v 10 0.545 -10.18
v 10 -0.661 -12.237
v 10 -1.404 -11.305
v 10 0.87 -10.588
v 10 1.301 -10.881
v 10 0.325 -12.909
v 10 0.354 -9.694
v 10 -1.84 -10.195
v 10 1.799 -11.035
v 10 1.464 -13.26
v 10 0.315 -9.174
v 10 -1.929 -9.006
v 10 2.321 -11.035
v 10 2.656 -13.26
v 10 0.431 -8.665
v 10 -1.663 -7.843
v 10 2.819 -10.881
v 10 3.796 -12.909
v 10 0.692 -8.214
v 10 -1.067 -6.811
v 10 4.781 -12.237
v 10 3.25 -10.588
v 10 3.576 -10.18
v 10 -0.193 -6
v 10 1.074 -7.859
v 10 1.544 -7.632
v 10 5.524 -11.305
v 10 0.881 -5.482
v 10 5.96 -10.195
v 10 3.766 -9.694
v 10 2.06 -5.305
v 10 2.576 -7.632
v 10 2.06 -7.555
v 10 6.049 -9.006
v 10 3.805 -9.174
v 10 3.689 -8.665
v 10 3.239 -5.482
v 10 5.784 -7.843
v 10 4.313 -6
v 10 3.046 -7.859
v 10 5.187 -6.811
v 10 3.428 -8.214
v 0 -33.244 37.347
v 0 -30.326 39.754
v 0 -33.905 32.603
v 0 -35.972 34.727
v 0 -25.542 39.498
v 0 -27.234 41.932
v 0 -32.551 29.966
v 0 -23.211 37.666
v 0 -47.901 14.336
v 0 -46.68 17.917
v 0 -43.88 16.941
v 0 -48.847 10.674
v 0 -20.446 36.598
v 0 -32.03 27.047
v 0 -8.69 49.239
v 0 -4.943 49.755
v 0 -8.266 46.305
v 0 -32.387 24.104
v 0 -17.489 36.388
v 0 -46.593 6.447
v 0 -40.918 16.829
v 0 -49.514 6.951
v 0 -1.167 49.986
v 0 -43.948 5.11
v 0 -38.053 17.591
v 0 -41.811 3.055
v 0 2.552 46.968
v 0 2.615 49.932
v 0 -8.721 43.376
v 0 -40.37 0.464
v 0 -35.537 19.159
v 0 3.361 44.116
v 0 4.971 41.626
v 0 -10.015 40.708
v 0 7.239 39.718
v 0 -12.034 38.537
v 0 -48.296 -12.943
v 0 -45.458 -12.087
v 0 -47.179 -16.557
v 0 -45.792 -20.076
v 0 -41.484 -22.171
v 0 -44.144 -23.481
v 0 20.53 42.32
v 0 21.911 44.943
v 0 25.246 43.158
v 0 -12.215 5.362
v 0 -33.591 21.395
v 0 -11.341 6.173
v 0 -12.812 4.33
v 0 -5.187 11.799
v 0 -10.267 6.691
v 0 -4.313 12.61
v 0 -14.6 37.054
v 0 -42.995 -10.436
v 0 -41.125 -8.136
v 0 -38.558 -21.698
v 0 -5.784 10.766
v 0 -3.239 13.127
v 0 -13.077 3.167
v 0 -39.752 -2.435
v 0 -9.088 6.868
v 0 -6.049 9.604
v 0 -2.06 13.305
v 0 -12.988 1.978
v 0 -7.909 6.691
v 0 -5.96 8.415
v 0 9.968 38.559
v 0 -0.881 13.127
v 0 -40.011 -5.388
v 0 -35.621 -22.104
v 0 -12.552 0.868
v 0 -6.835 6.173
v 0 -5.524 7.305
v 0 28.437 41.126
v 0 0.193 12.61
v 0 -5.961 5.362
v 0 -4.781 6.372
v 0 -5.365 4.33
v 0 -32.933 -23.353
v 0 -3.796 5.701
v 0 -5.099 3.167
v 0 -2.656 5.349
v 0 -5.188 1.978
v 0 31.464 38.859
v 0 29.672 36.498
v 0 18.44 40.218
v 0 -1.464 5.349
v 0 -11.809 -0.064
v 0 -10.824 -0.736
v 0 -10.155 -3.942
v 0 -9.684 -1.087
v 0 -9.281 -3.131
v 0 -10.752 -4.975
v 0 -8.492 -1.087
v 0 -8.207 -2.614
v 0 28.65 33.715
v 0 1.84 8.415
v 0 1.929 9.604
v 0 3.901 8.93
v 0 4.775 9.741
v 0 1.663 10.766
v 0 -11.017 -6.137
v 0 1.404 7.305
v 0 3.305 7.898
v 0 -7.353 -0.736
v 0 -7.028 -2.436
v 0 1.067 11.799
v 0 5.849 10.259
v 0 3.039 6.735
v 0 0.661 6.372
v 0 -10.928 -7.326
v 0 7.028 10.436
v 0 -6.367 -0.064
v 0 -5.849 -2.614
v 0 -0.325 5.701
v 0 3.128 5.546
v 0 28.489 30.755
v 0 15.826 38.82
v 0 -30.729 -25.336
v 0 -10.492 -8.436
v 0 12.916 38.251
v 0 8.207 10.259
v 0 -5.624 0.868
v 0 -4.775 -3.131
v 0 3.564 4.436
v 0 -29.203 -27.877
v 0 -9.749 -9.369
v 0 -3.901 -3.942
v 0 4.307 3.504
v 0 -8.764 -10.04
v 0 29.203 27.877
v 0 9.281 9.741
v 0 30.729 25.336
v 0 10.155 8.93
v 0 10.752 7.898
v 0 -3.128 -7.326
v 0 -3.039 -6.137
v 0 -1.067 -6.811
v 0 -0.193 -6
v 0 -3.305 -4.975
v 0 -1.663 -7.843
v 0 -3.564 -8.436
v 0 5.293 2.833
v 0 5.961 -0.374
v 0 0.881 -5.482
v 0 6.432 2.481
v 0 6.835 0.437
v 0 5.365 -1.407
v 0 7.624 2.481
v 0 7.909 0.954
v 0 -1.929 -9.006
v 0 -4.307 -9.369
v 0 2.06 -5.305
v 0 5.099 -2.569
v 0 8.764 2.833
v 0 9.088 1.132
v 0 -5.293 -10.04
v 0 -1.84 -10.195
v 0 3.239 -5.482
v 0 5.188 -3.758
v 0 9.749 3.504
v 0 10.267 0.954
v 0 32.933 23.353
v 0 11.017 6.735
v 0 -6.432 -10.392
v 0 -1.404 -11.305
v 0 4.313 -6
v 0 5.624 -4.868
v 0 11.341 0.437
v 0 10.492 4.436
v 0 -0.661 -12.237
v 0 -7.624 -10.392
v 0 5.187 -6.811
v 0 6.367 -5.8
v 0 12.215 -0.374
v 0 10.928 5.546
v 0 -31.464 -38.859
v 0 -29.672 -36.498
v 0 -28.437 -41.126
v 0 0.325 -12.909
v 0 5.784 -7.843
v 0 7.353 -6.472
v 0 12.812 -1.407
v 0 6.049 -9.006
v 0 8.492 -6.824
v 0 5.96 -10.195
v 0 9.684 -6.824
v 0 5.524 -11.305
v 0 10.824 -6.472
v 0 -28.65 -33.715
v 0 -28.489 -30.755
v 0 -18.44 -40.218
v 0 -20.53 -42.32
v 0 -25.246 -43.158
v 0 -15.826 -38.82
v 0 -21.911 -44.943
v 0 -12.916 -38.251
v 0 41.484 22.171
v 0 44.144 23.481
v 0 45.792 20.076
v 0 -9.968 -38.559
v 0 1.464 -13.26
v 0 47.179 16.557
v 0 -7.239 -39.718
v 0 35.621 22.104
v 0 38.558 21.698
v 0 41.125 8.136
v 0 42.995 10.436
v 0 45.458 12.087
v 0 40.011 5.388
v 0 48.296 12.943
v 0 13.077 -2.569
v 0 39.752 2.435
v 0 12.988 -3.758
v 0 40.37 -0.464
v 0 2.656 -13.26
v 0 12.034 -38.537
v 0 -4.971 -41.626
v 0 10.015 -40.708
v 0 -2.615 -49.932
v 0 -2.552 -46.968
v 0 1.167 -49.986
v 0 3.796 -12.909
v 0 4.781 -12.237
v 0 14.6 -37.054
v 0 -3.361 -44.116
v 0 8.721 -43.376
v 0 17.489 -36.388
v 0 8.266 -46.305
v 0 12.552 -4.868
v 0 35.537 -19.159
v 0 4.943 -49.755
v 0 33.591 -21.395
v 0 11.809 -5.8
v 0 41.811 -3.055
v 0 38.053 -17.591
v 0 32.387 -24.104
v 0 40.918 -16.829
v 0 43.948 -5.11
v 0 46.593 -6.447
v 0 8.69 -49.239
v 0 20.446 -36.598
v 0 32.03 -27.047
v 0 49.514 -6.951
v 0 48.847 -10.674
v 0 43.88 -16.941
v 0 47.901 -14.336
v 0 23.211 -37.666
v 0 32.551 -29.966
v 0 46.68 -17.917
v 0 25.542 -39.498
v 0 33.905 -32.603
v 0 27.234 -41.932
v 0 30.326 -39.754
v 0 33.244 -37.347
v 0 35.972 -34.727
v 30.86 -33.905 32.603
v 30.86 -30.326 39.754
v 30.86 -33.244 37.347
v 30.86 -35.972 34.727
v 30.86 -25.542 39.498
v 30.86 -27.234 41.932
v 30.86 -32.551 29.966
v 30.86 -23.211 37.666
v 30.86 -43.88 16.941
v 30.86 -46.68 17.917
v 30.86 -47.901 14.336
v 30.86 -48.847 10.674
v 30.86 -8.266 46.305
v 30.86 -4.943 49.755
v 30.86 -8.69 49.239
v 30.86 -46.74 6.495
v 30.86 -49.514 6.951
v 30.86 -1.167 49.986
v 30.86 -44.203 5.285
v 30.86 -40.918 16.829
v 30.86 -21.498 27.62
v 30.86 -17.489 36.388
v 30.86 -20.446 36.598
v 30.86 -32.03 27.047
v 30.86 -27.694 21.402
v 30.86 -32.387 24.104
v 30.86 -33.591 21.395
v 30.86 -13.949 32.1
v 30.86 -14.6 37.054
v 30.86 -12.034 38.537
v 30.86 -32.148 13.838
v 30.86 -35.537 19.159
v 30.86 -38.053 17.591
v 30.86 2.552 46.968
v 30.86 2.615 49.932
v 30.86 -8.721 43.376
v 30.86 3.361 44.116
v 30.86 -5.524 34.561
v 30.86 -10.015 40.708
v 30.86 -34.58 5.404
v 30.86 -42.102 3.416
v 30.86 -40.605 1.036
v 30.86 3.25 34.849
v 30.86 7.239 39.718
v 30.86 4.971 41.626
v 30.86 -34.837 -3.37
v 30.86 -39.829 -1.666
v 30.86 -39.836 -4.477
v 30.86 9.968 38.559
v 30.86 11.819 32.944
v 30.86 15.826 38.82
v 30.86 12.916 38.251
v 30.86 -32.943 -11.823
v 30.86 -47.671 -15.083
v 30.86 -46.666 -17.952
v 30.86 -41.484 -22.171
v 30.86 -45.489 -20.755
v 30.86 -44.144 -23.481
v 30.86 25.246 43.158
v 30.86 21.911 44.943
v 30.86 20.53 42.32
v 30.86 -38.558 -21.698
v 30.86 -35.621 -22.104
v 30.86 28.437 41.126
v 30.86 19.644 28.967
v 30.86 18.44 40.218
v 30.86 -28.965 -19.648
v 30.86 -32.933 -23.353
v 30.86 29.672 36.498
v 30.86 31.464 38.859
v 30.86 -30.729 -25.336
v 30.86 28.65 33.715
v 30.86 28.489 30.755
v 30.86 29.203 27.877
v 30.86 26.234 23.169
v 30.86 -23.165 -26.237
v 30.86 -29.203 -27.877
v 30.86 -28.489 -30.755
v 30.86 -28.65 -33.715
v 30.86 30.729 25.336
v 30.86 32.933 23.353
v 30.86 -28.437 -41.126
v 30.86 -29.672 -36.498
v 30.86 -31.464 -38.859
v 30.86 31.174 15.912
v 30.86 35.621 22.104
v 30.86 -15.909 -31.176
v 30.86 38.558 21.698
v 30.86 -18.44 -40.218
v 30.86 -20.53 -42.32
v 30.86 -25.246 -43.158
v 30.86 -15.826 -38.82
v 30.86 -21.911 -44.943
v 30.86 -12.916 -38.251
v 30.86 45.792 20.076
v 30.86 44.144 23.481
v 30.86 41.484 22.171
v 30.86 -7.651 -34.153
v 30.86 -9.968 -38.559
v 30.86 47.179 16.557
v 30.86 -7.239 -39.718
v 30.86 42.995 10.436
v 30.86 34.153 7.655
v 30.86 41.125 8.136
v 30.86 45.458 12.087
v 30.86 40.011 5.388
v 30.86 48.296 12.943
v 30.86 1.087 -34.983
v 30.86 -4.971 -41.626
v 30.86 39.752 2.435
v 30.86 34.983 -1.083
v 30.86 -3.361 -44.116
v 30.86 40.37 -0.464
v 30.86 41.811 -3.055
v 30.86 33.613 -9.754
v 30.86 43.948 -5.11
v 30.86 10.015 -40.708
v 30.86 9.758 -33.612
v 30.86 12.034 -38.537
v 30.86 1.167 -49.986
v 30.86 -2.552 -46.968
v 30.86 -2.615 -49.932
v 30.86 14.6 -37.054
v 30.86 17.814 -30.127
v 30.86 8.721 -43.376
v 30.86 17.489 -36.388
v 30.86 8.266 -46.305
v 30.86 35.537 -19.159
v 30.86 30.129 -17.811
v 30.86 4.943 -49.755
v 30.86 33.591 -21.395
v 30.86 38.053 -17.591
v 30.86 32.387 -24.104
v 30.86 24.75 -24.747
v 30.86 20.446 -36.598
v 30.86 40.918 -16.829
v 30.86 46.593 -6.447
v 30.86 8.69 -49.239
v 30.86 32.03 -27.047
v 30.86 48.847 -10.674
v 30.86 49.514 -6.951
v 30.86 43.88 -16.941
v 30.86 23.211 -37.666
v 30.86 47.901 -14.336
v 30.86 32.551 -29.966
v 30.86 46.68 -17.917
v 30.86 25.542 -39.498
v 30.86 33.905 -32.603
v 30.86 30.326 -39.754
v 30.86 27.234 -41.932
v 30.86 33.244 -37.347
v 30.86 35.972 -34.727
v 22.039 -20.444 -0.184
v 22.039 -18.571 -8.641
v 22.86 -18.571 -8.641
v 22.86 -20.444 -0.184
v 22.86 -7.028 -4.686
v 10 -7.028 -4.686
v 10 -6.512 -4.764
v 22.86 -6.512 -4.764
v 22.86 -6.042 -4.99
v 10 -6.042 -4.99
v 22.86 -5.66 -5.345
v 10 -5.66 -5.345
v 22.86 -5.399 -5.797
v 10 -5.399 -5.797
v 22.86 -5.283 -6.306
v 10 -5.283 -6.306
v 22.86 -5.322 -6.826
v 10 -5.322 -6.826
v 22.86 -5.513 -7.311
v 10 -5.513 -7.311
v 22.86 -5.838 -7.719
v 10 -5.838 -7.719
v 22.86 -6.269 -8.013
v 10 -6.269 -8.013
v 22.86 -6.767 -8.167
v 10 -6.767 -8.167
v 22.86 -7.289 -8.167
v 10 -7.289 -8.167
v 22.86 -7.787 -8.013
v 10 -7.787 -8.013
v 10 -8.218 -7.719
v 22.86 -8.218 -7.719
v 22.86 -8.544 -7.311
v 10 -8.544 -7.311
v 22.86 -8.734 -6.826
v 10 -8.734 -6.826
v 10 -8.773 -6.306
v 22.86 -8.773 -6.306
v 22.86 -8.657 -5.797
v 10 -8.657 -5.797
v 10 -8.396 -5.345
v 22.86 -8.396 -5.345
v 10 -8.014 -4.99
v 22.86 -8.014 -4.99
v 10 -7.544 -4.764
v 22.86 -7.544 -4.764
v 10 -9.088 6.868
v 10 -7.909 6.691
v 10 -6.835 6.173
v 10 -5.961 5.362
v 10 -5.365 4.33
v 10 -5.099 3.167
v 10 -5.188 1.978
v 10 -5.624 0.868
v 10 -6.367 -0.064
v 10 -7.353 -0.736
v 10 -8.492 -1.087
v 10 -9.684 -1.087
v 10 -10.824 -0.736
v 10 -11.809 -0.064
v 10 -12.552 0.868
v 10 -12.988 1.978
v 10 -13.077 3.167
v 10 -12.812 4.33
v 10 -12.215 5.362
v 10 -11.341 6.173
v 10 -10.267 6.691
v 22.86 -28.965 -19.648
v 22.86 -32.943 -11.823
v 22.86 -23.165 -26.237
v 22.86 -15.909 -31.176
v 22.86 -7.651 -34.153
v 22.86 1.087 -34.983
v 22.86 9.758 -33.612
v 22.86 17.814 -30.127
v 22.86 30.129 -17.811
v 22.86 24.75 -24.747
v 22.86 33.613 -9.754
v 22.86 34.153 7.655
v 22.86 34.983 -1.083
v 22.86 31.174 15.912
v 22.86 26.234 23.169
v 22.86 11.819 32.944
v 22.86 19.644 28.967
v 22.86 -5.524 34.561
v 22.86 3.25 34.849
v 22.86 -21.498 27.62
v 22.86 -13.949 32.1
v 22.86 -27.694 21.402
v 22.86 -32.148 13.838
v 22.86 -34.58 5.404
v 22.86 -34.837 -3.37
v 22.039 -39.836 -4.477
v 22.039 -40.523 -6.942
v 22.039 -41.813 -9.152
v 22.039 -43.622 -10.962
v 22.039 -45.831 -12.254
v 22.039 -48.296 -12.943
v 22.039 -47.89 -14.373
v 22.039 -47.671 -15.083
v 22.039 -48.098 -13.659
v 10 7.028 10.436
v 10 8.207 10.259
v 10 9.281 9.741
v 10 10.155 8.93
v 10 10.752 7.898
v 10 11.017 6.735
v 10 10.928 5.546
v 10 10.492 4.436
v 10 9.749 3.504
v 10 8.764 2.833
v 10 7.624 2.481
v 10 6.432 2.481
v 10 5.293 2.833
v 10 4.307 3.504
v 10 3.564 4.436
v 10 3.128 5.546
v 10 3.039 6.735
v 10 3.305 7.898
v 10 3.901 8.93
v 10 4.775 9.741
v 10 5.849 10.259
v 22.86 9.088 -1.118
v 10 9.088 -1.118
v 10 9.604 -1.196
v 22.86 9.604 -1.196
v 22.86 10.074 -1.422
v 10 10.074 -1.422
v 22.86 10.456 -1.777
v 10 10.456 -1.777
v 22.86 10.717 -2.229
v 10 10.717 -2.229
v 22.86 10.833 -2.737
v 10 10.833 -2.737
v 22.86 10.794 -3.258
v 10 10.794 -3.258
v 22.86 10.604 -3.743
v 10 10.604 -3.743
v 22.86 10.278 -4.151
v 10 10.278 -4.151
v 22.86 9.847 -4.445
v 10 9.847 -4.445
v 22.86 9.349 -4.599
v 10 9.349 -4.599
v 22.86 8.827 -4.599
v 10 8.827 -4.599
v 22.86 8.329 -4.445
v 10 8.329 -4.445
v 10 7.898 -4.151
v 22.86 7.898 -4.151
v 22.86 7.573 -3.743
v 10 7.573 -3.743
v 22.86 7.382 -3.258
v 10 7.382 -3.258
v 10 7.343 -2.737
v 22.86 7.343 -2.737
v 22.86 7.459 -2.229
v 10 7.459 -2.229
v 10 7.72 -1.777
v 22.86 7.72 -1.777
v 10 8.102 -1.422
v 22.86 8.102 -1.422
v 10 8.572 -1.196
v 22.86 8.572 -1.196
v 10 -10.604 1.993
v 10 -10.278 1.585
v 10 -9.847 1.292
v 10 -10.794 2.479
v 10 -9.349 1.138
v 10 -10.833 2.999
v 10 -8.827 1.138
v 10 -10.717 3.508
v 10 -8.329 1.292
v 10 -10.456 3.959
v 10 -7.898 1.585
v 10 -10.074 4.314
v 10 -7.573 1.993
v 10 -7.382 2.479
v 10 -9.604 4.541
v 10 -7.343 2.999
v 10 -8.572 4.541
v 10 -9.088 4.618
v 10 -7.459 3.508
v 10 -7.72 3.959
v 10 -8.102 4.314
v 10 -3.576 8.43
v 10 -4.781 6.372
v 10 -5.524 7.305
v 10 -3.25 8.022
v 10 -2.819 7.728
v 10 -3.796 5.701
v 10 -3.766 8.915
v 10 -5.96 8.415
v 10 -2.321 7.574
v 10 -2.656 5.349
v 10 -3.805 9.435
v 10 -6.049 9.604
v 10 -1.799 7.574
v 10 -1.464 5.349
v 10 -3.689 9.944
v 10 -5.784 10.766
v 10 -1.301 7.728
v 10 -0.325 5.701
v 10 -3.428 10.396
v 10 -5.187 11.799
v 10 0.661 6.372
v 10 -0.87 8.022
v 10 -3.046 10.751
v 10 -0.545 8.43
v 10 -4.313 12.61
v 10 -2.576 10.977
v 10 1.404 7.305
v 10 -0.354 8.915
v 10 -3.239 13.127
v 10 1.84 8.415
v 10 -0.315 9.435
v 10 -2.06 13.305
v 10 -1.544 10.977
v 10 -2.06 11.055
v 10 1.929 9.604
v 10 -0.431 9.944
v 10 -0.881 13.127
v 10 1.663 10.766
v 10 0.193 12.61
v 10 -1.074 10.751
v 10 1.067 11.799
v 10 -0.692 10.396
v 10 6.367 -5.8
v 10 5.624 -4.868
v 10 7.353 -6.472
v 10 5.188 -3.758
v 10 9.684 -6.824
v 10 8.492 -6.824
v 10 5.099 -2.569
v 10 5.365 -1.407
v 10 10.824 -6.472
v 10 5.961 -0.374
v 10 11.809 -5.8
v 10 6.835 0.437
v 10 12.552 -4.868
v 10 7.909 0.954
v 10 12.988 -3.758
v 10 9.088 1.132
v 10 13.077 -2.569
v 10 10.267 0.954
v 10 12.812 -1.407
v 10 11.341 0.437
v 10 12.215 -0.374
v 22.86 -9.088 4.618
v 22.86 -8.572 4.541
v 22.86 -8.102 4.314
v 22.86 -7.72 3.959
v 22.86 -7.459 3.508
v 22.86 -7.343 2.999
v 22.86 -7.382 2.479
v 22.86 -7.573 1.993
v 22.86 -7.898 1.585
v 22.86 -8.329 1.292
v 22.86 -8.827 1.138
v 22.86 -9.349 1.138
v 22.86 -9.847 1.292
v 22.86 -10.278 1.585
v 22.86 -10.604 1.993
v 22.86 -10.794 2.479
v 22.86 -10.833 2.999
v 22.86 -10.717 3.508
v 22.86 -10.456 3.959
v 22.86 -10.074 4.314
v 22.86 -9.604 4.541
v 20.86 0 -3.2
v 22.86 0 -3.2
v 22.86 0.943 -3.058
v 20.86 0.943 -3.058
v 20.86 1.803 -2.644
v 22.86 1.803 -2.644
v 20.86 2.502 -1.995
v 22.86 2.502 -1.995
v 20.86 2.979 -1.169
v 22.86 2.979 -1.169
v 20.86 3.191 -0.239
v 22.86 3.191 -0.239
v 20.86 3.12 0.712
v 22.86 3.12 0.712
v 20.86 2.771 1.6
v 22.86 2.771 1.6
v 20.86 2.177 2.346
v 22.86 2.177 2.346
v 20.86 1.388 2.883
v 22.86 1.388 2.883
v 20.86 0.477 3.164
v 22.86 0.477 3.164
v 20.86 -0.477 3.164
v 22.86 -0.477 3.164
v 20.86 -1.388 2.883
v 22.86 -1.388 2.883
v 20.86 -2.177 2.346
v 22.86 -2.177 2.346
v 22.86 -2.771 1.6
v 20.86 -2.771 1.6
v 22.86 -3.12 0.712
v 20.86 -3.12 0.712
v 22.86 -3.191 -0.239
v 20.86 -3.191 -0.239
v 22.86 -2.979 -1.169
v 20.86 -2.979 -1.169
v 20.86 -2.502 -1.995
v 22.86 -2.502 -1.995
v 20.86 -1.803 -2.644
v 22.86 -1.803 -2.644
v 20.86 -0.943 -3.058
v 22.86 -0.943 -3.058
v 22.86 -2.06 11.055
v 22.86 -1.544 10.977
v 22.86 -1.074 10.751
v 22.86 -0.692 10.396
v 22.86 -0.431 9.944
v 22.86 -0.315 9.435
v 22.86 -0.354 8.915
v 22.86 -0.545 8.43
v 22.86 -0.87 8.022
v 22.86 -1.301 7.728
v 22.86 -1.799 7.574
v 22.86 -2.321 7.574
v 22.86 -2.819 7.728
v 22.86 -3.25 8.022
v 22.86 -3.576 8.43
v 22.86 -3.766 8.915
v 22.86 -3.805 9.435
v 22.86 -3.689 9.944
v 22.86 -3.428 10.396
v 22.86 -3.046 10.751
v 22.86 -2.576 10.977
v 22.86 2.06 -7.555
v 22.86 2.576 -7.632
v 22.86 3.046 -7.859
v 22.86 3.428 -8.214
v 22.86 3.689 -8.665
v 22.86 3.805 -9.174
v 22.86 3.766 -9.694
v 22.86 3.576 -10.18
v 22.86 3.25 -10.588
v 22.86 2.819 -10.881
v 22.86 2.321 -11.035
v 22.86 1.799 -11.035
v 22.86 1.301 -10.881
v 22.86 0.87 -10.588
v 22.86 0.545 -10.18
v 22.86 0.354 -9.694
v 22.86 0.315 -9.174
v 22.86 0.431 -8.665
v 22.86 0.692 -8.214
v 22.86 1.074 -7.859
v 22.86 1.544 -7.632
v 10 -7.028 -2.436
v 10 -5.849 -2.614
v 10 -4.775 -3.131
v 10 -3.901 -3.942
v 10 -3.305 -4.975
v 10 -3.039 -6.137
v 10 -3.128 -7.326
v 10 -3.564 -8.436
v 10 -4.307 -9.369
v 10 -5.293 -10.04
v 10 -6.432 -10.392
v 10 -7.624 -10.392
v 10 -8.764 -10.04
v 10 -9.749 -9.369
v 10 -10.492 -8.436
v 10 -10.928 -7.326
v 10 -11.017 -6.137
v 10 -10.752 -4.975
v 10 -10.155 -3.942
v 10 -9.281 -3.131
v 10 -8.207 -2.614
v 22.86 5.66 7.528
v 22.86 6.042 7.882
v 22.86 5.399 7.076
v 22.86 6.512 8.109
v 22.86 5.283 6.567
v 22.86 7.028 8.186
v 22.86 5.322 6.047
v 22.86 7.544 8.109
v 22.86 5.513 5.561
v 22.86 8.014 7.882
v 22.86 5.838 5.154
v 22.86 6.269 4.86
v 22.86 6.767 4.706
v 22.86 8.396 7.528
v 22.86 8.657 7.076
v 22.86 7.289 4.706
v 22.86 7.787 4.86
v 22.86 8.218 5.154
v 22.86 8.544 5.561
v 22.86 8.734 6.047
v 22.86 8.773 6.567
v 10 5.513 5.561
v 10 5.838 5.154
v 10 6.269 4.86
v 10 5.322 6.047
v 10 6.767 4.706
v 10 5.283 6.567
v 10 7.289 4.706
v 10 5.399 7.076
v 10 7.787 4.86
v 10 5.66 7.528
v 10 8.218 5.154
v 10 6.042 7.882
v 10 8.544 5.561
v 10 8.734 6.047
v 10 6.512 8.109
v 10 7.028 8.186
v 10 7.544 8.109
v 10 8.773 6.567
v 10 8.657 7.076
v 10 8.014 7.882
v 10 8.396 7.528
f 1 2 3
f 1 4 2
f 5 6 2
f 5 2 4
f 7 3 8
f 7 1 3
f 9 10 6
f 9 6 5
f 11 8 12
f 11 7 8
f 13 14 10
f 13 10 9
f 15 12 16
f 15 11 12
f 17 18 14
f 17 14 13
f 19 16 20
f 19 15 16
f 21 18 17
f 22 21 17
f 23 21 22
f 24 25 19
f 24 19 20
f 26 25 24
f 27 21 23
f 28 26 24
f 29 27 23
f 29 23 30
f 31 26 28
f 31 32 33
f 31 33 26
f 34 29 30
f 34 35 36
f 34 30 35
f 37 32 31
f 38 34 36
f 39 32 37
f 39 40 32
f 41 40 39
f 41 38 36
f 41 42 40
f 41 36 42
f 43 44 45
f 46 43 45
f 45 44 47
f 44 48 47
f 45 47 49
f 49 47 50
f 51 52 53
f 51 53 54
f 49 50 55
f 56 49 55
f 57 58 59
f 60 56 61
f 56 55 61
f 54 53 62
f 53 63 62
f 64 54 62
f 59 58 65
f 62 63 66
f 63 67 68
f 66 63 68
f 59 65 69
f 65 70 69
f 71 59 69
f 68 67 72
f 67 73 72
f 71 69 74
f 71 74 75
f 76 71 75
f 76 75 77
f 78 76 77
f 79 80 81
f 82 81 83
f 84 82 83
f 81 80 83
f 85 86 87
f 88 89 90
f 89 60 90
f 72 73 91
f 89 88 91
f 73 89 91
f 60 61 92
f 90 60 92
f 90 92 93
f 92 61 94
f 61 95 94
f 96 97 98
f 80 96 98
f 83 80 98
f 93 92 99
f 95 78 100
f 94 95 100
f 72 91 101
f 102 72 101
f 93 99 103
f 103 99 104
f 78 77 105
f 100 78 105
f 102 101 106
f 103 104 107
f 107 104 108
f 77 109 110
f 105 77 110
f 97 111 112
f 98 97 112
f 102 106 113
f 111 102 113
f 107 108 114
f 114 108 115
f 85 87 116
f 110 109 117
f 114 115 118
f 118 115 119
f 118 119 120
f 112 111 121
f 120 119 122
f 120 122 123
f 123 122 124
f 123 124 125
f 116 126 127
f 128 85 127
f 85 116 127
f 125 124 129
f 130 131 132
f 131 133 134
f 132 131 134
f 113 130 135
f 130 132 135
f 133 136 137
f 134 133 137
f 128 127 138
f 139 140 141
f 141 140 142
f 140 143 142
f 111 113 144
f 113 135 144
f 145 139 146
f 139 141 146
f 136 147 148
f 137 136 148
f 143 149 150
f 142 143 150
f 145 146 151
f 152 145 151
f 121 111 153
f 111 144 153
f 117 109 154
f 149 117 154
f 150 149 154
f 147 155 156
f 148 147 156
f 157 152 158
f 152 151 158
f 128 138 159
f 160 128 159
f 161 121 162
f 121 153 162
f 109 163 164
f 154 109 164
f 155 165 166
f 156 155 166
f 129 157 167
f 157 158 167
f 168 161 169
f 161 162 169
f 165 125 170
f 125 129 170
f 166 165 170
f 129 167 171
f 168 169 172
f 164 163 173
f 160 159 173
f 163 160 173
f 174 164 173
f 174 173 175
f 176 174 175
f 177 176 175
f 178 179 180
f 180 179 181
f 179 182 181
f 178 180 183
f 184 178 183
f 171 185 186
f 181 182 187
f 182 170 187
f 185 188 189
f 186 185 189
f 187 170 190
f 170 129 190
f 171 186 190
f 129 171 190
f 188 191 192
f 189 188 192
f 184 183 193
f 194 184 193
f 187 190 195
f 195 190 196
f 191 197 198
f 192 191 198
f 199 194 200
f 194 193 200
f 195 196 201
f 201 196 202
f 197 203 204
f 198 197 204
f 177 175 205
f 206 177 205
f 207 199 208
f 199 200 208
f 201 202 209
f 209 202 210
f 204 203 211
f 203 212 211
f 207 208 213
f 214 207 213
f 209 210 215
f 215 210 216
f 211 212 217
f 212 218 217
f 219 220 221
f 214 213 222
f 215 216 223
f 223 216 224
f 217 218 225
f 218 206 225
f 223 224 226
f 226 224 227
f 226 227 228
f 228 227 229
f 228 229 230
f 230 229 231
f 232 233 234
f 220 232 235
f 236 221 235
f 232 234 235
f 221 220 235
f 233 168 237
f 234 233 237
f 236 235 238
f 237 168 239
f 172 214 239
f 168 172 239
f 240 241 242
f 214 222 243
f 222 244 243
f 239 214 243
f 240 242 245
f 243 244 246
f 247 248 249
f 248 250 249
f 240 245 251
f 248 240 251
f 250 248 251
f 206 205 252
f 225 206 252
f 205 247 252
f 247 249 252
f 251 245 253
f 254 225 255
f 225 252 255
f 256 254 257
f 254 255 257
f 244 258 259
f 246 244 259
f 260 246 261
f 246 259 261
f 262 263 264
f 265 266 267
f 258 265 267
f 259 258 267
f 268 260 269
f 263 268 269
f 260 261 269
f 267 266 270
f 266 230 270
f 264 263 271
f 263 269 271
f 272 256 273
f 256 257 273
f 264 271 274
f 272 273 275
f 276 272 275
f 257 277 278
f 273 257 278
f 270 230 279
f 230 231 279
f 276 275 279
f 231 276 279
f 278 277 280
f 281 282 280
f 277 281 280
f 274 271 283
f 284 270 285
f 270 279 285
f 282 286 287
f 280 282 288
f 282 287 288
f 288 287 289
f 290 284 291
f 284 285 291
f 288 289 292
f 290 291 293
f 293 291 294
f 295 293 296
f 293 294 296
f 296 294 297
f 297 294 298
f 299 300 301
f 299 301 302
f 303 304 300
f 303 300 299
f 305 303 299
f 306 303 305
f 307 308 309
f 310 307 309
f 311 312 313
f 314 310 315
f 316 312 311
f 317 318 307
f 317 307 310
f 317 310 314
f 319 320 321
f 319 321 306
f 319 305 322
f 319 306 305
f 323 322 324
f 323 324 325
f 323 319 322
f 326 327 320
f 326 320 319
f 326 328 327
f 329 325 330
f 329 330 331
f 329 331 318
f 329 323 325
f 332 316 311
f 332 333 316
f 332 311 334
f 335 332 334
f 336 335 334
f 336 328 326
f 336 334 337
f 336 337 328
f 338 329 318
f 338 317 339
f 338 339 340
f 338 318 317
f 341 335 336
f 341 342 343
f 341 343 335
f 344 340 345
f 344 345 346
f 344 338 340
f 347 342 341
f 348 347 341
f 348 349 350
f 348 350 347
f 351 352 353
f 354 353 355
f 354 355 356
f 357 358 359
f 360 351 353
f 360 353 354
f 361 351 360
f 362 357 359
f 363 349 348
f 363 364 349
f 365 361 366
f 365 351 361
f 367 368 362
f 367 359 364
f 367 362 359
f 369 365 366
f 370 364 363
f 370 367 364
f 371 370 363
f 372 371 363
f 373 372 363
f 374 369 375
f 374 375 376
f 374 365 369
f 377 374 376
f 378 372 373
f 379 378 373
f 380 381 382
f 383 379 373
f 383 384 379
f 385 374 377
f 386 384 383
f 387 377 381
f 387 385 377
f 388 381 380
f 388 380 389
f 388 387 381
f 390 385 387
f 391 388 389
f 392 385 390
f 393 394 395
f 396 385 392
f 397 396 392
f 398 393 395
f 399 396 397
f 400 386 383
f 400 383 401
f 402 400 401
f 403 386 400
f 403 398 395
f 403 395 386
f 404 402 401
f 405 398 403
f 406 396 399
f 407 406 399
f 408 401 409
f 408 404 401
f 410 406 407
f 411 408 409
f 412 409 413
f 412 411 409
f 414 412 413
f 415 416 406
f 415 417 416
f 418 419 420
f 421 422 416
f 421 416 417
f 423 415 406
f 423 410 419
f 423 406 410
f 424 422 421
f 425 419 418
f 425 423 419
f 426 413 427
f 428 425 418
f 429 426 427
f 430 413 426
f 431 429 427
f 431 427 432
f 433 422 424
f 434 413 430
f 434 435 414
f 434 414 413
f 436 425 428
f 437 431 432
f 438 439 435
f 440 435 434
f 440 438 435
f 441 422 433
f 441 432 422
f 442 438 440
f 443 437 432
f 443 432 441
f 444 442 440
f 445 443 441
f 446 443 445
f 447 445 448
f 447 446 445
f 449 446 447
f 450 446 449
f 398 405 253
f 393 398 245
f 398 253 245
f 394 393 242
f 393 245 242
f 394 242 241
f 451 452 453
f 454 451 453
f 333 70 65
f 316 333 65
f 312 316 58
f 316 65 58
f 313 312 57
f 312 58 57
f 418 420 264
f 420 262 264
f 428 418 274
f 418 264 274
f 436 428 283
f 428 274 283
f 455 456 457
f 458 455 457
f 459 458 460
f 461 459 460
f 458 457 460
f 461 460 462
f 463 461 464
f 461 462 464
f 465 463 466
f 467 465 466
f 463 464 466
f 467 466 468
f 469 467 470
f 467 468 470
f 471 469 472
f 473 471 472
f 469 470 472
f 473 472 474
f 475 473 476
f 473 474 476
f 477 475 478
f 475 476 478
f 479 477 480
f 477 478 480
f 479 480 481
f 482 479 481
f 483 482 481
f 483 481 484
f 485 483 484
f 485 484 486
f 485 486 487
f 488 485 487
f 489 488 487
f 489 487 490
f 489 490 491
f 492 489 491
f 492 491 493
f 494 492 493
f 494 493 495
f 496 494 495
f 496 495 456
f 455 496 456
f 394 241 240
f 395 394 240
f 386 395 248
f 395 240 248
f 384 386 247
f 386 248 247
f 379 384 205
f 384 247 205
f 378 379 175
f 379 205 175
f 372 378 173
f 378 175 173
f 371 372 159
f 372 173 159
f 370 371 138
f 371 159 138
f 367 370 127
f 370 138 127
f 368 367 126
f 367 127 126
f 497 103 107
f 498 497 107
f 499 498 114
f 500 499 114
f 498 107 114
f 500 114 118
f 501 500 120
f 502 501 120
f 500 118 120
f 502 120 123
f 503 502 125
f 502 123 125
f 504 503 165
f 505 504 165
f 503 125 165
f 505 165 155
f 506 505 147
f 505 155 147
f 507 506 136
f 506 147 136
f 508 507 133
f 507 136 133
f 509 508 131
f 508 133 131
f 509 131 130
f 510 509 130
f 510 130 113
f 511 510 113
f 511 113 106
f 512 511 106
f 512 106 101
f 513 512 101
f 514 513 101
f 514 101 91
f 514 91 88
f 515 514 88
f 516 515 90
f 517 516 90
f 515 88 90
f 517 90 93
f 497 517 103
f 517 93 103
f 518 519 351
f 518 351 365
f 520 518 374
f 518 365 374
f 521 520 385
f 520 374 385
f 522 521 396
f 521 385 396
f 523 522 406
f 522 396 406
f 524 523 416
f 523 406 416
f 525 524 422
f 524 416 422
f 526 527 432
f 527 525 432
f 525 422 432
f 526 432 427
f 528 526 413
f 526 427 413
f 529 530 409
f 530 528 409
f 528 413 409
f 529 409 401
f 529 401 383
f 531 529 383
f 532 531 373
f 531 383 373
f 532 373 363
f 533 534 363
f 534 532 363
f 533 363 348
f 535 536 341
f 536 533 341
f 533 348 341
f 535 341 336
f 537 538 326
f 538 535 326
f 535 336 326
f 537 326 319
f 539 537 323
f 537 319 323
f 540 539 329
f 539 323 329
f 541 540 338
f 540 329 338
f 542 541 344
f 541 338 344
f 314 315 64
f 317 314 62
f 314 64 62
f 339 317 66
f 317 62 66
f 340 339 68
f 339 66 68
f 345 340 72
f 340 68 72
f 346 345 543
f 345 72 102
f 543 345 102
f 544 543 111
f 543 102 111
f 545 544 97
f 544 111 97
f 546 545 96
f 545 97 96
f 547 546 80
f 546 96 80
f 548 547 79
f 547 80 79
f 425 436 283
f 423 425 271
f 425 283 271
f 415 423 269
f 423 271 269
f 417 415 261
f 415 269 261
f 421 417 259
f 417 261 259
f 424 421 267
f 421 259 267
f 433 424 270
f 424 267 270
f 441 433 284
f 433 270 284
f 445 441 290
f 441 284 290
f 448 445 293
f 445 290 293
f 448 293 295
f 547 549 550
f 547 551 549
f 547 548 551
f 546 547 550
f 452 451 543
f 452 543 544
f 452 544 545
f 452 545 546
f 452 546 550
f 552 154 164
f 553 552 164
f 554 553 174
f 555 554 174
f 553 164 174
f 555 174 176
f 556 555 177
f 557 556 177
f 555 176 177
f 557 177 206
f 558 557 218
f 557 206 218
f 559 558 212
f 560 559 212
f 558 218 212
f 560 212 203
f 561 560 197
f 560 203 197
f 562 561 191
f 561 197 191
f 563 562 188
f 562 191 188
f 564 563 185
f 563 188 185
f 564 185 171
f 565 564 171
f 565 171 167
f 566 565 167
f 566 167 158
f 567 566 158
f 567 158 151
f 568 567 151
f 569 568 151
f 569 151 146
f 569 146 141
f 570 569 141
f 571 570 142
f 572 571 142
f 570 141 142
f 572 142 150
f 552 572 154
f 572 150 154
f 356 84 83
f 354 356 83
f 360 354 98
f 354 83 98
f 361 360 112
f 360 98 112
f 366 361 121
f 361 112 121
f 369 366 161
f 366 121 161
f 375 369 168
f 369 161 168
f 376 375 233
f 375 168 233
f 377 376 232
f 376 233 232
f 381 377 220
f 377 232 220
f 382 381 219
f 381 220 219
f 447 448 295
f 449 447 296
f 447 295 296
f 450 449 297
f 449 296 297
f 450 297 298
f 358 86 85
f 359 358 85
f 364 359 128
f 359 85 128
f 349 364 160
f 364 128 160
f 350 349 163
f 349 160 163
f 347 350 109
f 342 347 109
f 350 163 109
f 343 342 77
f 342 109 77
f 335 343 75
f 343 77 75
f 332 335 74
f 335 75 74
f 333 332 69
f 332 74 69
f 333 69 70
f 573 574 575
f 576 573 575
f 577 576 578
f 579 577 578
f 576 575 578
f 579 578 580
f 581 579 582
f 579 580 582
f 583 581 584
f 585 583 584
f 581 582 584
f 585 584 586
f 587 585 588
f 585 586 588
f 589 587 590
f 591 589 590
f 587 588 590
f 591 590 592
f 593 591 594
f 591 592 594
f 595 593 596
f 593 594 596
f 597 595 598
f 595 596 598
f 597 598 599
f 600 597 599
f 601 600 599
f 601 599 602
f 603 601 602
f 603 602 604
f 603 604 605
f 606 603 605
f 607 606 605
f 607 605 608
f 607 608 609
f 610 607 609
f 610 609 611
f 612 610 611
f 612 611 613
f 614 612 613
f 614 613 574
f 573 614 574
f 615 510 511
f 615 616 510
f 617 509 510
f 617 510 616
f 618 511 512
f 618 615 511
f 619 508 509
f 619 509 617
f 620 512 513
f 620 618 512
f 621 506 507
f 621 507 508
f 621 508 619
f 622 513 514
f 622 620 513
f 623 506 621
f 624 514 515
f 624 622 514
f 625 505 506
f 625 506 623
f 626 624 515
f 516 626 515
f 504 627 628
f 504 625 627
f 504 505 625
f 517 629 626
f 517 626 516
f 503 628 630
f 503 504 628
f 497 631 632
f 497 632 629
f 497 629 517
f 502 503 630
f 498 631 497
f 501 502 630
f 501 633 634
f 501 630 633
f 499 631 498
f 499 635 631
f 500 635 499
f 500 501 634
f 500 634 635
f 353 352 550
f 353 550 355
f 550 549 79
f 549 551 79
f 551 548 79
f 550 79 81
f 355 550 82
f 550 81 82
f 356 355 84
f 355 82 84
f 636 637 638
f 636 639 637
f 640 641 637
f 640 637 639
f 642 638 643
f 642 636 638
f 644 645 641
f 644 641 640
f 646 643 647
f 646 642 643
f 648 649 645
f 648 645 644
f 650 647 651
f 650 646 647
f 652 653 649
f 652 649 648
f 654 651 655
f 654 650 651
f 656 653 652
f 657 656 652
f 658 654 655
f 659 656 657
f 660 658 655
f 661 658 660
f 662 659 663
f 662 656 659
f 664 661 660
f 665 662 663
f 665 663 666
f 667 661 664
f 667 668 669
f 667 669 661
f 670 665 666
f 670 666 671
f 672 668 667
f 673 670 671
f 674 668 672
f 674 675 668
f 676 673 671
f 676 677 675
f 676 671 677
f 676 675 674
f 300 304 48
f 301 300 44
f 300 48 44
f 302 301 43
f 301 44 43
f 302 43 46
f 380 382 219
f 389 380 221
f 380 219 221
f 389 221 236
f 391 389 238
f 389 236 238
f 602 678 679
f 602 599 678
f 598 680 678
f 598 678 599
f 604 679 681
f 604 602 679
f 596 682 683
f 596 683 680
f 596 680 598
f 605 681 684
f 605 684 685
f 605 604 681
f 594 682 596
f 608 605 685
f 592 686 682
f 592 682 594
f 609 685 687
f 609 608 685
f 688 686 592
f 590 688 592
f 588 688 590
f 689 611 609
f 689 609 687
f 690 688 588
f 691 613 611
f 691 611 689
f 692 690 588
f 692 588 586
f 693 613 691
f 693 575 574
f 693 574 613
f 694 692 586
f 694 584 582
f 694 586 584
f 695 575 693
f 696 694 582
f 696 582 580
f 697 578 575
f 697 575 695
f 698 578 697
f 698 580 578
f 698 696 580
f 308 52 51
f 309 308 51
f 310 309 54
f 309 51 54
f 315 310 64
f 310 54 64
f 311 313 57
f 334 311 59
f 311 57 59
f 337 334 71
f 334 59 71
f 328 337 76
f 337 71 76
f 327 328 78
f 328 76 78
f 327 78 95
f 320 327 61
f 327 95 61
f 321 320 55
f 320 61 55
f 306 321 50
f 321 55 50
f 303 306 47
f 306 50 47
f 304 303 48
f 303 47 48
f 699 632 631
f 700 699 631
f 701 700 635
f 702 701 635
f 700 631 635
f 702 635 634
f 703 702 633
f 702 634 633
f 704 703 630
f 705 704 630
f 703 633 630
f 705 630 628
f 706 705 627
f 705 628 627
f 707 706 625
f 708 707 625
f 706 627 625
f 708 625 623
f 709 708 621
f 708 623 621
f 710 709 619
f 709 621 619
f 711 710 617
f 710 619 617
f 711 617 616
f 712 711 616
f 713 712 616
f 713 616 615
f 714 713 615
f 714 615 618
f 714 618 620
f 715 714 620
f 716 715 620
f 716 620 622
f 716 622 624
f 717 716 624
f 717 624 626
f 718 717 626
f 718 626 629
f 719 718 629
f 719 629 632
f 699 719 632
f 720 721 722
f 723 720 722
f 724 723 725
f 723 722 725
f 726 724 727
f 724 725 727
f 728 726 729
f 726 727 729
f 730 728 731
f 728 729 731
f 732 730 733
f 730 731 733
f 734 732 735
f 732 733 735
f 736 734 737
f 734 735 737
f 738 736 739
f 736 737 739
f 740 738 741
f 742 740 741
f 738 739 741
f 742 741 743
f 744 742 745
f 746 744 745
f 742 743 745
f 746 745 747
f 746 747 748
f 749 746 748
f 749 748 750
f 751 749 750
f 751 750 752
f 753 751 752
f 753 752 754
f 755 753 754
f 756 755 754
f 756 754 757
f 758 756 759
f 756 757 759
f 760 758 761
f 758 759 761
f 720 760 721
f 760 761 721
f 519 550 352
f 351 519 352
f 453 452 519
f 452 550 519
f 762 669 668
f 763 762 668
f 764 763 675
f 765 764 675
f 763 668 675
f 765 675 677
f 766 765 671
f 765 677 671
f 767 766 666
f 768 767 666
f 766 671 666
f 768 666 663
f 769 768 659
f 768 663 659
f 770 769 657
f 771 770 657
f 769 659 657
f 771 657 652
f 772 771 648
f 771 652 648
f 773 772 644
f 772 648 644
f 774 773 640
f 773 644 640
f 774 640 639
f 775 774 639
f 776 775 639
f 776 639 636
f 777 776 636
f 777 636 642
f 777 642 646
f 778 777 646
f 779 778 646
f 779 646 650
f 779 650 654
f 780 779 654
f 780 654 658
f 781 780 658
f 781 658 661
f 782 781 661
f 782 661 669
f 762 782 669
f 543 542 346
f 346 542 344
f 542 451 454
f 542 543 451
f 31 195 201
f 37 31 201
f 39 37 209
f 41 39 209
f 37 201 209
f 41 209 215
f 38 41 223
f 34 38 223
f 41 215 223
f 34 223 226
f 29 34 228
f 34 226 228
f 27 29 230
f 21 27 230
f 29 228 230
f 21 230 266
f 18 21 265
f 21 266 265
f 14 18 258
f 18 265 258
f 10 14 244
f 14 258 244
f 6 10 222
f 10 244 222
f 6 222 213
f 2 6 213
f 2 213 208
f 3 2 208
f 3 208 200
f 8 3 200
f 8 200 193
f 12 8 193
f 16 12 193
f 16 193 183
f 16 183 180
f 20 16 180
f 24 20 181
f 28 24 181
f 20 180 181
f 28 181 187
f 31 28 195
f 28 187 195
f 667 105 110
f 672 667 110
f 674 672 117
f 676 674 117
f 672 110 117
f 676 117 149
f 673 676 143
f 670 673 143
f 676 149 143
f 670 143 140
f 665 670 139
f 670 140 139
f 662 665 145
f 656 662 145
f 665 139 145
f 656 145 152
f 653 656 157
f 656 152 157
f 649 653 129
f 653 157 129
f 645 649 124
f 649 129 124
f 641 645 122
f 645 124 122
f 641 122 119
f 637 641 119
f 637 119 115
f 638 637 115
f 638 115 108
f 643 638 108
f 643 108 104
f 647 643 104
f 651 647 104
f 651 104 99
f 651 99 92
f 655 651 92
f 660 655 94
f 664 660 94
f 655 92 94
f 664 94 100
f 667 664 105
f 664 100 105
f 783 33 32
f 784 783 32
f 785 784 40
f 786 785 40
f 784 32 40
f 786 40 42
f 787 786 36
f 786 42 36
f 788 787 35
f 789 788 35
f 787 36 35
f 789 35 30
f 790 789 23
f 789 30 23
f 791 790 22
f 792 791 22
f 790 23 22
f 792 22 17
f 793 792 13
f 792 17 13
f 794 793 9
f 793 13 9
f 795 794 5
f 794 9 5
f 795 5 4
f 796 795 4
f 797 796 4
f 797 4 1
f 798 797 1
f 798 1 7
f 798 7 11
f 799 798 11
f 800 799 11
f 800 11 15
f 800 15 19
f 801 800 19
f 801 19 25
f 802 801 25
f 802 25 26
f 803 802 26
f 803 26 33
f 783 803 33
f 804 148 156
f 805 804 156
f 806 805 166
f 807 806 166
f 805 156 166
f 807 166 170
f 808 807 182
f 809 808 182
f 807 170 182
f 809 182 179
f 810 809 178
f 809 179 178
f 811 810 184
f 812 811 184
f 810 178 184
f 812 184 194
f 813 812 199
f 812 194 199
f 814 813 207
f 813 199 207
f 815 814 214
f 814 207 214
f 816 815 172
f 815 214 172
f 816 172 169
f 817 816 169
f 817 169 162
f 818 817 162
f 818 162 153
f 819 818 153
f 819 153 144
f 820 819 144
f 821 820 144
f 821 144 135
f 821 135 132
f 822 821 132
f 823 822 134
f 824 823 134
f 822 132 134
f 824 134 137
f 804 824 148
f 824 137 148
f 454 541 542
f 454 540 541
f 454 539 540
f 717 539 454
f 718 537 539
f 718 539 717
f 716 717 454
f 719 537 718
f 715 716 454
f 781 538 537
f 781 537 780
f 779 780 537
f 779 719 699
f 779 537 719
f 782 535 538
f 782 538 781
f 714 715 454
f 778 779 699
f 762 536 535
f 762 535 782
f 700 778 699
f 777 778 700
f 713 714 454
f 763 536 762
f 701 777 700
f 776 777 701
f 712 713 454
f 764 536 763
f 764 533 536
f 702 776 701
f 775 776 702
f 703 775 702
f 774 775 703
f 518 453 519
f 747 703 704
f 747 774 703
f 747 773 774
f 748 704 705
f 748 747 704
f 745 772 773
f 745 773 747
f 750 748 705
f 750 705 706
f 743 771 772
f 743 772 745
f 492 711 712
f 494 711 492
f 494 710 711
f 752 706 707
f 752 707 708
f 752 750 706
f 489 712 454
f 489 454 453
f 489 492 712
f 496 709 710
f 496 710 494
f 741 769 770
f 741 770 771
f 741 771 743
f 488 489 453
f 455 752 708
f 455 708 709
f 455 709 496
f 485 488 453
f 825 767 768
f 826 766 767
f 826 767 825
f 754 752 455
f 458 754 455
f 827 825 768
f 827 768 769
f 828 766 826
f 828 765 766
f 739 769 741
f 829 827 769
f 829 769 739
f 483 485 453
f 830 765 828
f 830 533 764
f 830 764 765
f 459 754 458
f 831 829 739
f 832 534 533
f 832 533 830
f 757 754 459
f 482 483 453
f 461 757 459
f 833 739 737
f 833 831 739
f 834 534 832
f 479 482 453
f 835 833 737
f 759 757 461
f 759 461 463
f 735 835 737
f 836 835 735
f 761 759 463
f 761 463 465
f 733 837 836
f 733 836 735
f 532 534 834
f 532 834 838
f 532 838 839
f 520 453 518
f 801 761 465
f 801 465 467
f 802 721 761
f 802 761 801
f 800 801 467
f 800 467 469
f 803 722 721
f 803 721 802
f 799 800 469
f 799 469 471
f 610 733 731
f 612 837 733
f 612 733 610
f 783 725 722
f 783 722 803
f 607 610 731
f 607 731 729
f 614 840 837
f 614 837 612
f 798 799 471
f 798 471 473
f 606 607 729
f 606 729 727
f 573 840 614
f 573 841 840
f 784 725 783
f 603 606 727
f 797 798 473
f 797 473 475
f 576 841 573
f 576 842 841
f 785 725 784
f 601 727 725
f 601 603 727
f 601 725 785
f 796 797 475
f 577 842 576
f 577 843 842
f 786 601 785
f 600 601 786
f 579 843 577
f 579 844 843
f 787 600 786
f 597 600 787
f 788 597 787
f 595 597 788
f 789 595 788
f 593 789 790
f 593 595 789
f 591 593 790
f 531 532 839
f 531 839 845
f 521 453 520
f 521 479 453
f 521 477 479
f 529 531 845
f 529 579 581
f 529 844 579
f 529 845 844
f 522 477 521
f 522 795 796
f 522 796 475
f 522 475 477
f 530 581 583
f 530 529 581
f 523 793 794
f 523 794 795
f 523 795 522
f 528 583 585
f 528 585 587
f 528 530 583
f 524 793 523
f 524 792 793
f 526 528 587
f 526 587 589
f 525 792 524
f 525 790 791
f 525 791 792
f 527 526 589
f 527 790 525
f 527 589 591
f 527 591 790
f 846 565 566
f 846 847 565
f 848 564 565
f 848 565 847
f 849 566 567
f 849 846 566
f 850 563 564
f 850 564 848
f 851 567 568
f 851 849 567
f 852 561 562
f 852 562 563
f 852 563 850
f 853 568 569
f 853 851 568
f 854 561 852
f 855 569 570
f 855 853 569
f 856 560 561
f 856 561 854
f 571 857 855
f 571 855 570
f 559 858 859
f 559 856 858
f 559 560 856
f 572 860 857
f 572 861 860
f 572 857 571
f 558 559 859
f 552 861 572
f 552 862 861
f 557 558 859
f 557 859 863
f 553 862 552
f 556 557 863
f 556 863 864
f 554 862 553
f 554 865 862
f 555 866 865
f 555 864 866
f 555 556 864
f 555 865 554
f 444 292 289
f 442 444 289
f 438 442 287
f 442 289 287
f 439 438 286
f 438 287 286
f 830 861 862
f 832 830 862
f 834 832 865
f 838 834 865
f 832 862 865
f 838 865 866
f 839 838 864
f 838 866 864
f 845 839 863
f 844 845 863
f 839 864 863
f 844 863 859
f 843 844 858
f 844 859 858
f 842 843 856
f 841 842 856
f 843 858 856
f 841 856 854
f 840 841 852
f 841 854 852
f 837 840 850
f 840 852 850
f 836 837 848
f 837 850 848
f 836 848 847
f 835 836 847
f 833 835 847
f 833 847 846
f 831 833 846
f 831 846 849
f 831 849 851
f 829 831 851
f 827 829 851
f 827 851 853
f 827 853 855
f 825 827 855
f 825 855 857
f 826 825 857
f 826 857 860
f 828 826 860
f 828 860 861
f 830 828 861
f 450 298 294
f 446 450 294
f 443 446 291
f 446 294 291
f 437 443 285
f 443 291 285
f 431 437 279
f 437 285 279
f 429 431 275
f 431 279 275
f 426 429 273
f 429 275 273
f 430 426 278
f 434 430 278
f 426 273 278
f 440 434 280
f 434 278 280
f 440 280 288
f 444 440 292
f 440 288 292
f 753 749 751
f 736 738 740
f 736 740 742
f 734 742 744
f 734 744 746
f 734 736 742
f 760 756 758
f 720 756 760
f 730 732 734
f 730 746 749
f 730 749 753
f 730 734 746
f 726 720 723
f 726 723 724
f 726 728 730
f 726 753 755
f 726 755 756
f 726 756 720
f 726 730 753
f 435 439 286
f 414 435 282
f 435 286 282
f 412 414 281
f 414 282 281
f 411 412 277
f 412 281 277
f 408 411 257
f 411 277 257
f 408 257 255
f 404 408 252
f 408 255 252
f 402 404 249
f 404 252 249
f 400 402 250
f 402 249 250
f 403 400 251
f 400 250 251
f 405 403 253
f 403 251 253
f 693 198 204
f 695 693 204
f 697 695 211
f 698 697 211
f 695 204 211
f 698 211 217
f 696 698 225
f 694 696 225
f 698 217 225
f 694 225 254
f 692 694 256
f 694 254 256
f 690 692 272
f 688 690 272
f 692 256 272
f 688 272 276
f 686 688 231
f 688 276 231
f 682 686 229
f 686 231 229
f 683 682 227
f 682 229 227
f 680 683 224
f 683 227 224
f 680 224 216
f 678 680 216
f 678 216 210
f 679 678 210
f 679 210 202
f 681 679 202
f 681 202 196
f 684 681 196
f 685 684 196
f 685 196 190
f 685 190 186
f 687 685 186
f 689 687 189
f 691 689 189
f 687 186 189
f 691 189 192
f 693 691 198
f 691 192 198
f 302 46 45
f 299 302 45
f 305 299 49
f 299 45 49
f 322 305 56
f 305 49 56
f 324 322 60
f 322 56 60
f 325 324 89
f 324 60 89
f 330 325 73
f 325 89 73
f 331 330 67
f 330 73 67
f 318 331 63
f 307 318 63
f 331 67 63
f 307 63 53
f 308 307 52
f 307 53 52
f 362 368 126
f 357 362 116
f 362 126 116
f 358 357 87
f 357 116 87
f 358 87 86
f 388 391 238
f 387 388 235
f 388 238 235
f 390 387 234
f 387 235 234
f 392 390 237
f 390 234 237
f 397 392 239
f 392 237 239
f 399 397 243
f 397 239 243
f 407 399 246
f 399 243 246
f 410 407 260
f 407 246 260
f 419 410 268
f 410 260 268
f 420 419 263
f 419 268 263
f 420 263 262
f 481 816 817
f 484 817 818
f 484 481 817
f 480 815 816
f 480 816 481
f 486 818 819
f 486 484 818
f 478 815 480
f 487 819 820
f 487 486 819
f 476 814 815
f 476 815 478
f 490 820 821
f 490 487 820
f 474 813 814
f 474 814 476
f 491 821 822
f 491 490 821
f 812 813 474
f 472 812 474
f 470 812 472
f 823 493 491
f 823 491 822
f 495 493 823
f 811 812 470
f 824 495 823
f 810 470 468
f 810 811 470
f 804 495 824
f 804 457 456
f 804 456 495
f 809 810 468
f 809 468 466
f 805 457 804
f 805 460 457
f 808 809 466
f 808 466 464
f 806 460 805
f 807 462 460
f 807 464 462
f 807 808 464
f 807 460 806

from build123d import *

# Parameters (mm, degrees)
SKETCH1_R           = 50
BOSS_EXTRUDE1_DEPTH = 30.86
SKETCH2_R           = 35
CUT_EXTRUDE1_DEPTH  = 8
CUT_EXTRUDE4_START  = -20
SKETCH10_W          = 10.01875972
SKETCH10_H          = 8.661840267
CUT_EXTRUDE4_DEPTH  = 60
SKETCH12_R          = 3.2
CUT_EXTRUDE5_DEPTH  = 2
SKETCH5_R           = 1.75
CUT_EXTRUDE3_DEPTH  = 30
SKETCH8_R           = 4
CUT_EXTRUDE6_DEPTH  = 10
SKETCH13_R          = 10
CUT_EXTRUDE8_DEPTH  = 40


with BuildPart() as part:
    # Sketch1 → Boss-Extrude1 (new body)
    with BuildSketch(Plane(origin=(0, 0, 0), x_dir=(0, 0, -1), z_dir=(1, 0, 0))):
        Circle(SKETCH1_R)
    extrude(amount=BOSS_EXTRUDE1_DEPTH)

    # Sketch2 → Cut-Extrude1 (cut)
    with BuildSketch(Plane(origin=(30.86, 0, 0), x_dir=(0, 0, -1), z_dir=(1, 0, 0))):
        Circle(SKETCH2_R)
    extrude(amount=-CUT_EXTRUDE1_DEPTH, mode=Mode.SUBTRACT)

    # Sketch10 → Cut-Extrude4 (cut)
    with BuildSketch(Plane(origin=(0, 0, 0), x_dir=(1, 0, 0), z_dir=(0, 0.976356599, 0.21616612)).offset(CUT_EXTRUDE4_START)):
        with Locations((27.048757514, 0.091052199)):
            Rectangle(SKETCH10_W, SKETCH10_H)
    extrude(amount=-CUT_EXTRUDE4_DEPTH, mode=Mode.SUBTRACT)

    # Sketch12 → Cut-Extrude5 (cut)
    with BuildSketch(Plane(origin=(22.86, 0, 0), x_dir=(0, 0, -1), z_dir=(1, 0, 0))):
        Circle(SKETCH12_R)
    extrude(amount=-CUT_EXTRUDE5_DEPTH, mode=Mode.SUBTRACT)

    # Sketch5 → Cut-Extrude3 (cut)
    with BuildSketch(Plane.ZY):
        with Locations((2.868272201, -9.088119419)):
            Circle(SKETCH5_R)
        with Locations((-6.436406189, -7.028056301)):
            Circle(SKETCH5_R)
        with Locations((-9.30467839, 2.060063119)):
            Circle(SKETCH5_R)
        with Locations((-2.868272201, 9.088119419)):
            Circle(SKETCH5_R)
        with Locations((6.436406189, 7.028056301)):
            Circle(SKETCH5_R)
        with Locations((9.30467839, -2.060063119)):
            Circle(SKETCH5_R)
    extrude(amount=-CUT_EXTRUDE3_DEPTH, mode=Mode.SUBTRACT)

    # Sketch8 → Cut-Extrude6 (cut)
    with BuildSketch(Plane.ZY):
        with Locations((-2.868272201, 9.088119419)):
            Circle(SKETCH8_R)
        with Locations((6.436406189, 7.028056301)):
            Circle(SKETCH8_R)
        with Locations((9.30467839, -2.060063119)):
            Circle(SKETCH8_R)
        with Locations((2.868272201, -9.088119419)):
            Circle(SKETCH8_R)
        with Locations((-6.436406189, -7.028056301)):
            Circle(SKETCH8_R)
        with Locations((-9.30467839, 2.060063119)):
            Circle(SKETCH8_R)
    extrude(amount=-CUT_EXTRUDE6_DEPTH, mode=Mode.SUBTRACT)

    # Sketch13 → Cut-Extrude8 (cut)
    with BuildSketch(Plane.ZY):
        with Locations((48.2405892, 12.470792391)):
            Circle(SKETCH13_R)
        with Locations((46.357604333, -18.266023916)):
            Circle(SKETCH13_R)
        with Locations((26.767590248, -42.025839926)):
            Circle(SKETCH13_R)
        with Locations((-3.046733515, -49.733213491)):
            Circle(SKETCH13_R)
        with Locations((-31.69730863, -38.444189871)):
            Circle(SKETCH13_R)
        with Locations((-48.2405892, -12.470792391)):
            Circle(SKETCH13_R)
        with Locations((-46.357604333, 18.266023916)):
            Circle(SKETCH13_R)
        with Locations((-26.767590248, 42.025839926)):
            Circle(SKETCH13_R)
        with Locations((3.046733515, 49.733213491)):
            Circle(SKETCH13_R)
        with Locations((31.69730863, 38.444189871)):
            Circle(SKETCH13_R)
    extrude(amount=-CUT_EXTRUDE8_DEPTH, mode=Mode.SUBTRACT)


solid = part.part
